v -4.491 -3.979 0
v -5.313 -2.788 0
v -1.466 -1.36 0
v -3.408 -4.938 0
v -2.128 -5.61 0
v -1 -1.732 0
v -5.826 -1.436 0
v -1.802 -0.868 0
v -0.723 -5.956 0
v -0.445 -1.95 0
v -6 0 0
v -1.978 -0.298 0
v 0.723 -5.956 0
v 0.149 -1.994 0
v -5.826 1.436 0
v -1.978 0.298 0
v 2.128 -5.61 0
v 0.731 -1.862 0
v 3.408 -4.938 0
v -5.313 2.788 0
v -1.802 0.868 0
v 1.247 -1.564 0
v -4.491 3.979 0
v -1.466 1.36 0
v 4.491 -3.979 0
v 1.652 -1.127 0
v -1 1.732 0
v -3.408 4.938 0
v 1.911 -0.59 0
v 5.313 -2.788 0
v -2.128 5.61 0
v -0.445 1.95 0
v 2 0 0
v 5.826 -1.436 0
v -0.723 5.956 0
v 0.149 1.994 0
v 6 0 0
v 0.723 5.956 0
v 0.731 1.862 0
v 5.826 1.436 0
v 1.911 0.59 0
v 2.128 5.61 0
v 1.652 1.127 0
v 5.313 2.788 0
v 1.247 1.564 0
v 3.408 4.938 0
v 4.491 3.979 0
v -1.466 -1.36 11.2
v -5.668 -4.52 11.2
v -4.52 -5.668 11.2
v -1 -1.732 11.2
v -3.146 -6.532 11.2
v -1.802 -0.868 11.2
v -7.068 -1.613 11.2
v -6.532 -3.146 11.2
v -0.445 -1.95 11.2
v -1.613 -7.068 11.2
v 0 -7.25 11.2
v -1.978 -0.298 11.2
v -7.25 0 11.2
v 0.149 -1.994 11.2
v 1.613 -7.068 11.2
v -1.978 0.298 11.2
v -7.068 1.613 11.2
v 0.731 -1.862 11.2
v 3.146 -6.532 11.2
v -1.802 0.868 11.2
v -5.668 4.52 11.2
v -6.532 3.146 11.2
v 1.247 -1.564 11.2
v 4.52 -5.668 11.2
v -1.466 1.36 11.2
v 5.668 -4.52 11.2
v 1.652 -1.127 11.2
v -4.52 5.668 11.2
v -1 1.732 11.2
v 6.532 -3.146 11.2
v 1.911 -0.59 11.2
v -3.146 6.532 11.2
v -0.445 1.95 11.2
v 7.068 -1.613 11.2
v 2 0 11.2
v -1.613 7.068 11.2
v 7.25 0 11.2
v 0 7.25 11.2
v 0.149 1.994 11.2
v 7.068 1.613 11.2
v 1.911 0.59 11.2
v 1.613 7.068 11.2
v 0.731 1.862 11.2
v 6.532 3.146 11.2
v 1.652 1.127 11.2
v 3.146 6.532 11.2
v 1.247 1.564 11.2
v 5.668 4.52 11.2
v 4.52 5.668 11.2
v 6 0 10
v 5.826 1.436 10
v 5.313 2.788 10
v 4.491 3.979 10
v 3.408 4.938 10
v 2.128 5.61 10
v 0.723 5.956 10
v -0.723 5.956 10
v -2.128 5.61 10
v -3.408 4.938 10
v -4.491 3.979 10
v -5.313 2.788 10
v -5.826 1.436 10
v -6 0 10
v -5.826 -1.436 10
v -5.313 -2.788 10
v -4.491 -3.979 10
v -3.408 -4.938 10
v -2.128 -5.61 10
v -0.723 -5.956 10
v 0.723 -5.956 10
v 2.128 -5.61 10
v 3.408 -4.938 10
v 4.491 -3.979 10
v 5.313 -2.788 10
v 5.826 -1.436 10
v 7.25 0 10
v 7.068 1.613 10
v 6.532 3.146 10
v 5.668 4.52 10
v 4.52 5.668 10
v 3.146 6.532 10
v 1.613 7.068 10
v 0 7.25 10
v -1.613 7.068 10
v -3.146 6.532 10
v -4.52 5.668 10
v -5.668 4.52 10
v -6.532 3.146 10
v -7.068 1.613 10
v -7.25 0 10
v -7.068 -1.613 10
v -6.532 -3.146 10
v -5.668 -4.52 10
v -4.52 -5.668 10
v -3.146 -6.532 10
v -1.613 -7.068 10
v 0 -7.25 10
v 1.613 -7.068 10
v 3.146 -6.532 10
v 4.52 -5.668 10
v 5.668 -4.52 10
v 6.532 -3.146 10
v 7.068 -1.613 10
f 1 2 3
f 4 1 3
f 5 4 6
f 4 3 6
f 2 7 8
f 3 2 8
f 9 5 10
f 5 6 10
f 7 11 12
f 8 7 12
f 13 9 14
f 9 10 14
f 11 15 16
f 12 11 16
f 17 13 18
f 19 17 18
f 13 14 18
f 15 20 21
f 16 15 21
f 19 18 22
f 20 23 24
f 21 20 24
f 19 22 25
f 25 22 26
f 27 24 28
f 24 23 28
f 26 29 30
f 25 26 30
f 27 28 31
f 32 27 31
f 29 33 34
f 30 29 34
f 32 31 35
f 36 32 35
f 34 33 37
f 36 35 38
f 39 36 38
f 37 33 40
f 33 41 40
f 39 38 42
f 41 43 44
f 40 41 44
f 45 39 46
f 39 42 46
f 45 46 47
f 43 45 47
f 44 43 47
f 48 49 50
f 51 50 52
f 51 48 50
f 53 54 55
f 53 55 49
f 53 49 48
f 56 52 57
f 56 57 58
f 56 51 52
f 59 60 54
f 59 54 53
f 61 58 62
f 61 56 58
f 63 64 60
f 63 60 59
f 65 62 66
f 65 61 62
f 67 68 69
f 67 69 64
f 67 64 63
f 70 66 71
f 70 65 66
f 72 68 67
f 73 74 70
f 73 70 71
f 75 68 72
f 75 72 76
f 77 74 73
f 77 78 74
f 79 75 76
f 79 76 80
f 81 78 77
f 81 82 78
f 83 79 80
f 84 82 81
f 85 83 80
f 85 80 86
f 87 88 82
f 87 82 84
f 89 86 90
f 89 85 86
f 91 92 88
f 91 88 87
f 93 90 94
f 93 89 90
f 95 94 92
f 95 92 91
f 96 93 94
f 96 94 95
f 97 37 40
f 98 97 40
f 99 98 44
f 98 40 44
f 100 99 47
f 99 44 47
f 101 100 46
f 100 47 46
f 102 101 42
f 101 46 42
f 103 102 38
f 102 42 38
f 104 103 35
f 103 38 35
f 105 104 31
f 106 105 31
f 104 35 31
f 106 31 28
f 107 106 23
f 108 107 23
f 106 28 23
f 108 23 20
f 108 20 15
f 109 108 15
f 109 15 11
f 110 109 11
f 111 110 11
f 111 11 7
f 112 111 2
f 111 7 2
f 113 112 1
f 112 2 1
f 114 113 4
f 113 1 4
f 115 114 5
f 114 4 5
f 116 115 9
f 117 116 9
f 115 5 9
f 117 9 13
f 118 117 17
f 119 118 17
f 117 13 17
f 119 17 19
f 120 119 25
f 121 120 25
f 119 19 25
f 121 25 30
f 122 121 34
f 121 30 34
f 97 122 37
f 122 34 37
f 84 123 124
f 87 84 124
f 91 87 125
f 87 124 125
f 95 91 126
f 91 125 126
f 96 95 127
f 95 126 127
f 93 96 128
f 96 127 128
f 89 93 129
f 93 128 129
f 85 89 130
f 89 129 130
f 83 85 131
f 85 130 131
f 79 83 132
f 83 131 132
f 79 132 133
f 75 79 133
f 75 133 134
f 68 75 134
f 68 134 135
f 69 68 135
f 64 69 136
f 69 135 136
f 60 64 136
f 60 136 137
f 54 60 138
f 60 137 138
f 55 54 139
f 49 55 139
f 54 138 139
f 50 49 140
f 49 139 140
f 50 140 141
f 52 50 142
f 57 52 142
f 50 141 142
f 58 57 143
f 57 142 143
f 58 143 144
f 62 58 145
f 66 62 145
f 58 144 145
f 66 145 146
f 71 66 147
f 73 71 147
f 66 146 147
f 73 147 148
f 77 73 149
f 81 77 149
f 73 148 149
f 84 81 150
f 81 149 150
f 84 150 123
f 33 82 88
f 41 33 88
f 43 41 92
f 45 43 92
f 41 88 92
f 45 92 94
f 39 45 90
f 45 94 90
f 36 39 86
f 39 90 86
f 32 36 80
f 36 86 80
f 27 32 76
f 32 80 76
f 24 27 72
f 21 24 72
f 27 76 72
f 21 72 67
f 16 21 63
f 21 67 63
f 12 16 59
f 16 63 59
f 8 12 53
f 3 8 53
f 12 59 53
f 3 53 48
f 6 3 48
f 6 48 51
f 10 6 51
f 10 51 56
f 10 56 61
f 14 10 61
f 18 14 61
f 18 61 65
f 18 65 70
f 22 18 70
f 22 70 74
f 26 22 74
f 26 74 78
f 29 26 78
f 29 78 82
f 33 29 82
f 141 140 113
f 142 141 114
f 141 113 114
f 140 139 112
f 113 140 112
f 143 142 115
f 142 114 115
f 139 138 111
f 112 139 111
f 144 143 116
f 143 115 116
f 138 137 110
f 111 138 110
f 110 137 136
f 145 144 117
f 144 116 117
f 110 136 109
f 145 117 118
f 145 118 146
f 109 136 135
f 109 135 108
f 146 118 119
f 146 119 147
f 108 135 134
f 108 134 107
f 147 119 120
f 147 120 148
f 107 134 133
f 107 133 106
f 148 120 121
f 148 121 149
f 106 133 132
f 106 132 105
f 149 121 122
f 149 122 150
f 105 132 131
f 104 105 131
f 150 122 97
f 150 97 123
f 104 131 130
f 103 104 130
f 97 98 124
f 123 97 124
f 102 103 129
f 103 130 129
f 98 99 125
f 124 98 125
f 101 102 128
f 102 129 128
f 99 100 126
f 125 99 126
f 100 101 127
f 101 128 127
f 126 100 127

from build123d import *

# Parameters (mm, degrees)
F0_R     = 6
F1_DEPTH = 10
F2_R     = 7.25
F2_R_2   = 6
F3_DEPTH = 1.2
F4_R     = 2
F5_DEPTH = 25


with BuildPart() as f1:
    # F0 (on Top) → F1 (new body)
    with BuildSketch(Plane.XY):
        Circle(F0_R)
    extrude(amount=F1_DEPTH)

    # F2 (on face) → F3 (join)
    with BuildSketch(Plane.XY.offset(10)):
        Circle(F2_R)
        Circle(F2_R_2, mode=Mode.SUBTRACT)
        Circle(F2_R_2)
    extrude(amount=F3_DEPTH)

    # F4 (on face) → F5 (cut)
    with BuildSketch(Plane.XY.offset(11.2)):
        Circle(F4_R)
    extrude(amount=-F5_DEPTH, mode=Mode.SUBTRACT)


solid = f1.part
